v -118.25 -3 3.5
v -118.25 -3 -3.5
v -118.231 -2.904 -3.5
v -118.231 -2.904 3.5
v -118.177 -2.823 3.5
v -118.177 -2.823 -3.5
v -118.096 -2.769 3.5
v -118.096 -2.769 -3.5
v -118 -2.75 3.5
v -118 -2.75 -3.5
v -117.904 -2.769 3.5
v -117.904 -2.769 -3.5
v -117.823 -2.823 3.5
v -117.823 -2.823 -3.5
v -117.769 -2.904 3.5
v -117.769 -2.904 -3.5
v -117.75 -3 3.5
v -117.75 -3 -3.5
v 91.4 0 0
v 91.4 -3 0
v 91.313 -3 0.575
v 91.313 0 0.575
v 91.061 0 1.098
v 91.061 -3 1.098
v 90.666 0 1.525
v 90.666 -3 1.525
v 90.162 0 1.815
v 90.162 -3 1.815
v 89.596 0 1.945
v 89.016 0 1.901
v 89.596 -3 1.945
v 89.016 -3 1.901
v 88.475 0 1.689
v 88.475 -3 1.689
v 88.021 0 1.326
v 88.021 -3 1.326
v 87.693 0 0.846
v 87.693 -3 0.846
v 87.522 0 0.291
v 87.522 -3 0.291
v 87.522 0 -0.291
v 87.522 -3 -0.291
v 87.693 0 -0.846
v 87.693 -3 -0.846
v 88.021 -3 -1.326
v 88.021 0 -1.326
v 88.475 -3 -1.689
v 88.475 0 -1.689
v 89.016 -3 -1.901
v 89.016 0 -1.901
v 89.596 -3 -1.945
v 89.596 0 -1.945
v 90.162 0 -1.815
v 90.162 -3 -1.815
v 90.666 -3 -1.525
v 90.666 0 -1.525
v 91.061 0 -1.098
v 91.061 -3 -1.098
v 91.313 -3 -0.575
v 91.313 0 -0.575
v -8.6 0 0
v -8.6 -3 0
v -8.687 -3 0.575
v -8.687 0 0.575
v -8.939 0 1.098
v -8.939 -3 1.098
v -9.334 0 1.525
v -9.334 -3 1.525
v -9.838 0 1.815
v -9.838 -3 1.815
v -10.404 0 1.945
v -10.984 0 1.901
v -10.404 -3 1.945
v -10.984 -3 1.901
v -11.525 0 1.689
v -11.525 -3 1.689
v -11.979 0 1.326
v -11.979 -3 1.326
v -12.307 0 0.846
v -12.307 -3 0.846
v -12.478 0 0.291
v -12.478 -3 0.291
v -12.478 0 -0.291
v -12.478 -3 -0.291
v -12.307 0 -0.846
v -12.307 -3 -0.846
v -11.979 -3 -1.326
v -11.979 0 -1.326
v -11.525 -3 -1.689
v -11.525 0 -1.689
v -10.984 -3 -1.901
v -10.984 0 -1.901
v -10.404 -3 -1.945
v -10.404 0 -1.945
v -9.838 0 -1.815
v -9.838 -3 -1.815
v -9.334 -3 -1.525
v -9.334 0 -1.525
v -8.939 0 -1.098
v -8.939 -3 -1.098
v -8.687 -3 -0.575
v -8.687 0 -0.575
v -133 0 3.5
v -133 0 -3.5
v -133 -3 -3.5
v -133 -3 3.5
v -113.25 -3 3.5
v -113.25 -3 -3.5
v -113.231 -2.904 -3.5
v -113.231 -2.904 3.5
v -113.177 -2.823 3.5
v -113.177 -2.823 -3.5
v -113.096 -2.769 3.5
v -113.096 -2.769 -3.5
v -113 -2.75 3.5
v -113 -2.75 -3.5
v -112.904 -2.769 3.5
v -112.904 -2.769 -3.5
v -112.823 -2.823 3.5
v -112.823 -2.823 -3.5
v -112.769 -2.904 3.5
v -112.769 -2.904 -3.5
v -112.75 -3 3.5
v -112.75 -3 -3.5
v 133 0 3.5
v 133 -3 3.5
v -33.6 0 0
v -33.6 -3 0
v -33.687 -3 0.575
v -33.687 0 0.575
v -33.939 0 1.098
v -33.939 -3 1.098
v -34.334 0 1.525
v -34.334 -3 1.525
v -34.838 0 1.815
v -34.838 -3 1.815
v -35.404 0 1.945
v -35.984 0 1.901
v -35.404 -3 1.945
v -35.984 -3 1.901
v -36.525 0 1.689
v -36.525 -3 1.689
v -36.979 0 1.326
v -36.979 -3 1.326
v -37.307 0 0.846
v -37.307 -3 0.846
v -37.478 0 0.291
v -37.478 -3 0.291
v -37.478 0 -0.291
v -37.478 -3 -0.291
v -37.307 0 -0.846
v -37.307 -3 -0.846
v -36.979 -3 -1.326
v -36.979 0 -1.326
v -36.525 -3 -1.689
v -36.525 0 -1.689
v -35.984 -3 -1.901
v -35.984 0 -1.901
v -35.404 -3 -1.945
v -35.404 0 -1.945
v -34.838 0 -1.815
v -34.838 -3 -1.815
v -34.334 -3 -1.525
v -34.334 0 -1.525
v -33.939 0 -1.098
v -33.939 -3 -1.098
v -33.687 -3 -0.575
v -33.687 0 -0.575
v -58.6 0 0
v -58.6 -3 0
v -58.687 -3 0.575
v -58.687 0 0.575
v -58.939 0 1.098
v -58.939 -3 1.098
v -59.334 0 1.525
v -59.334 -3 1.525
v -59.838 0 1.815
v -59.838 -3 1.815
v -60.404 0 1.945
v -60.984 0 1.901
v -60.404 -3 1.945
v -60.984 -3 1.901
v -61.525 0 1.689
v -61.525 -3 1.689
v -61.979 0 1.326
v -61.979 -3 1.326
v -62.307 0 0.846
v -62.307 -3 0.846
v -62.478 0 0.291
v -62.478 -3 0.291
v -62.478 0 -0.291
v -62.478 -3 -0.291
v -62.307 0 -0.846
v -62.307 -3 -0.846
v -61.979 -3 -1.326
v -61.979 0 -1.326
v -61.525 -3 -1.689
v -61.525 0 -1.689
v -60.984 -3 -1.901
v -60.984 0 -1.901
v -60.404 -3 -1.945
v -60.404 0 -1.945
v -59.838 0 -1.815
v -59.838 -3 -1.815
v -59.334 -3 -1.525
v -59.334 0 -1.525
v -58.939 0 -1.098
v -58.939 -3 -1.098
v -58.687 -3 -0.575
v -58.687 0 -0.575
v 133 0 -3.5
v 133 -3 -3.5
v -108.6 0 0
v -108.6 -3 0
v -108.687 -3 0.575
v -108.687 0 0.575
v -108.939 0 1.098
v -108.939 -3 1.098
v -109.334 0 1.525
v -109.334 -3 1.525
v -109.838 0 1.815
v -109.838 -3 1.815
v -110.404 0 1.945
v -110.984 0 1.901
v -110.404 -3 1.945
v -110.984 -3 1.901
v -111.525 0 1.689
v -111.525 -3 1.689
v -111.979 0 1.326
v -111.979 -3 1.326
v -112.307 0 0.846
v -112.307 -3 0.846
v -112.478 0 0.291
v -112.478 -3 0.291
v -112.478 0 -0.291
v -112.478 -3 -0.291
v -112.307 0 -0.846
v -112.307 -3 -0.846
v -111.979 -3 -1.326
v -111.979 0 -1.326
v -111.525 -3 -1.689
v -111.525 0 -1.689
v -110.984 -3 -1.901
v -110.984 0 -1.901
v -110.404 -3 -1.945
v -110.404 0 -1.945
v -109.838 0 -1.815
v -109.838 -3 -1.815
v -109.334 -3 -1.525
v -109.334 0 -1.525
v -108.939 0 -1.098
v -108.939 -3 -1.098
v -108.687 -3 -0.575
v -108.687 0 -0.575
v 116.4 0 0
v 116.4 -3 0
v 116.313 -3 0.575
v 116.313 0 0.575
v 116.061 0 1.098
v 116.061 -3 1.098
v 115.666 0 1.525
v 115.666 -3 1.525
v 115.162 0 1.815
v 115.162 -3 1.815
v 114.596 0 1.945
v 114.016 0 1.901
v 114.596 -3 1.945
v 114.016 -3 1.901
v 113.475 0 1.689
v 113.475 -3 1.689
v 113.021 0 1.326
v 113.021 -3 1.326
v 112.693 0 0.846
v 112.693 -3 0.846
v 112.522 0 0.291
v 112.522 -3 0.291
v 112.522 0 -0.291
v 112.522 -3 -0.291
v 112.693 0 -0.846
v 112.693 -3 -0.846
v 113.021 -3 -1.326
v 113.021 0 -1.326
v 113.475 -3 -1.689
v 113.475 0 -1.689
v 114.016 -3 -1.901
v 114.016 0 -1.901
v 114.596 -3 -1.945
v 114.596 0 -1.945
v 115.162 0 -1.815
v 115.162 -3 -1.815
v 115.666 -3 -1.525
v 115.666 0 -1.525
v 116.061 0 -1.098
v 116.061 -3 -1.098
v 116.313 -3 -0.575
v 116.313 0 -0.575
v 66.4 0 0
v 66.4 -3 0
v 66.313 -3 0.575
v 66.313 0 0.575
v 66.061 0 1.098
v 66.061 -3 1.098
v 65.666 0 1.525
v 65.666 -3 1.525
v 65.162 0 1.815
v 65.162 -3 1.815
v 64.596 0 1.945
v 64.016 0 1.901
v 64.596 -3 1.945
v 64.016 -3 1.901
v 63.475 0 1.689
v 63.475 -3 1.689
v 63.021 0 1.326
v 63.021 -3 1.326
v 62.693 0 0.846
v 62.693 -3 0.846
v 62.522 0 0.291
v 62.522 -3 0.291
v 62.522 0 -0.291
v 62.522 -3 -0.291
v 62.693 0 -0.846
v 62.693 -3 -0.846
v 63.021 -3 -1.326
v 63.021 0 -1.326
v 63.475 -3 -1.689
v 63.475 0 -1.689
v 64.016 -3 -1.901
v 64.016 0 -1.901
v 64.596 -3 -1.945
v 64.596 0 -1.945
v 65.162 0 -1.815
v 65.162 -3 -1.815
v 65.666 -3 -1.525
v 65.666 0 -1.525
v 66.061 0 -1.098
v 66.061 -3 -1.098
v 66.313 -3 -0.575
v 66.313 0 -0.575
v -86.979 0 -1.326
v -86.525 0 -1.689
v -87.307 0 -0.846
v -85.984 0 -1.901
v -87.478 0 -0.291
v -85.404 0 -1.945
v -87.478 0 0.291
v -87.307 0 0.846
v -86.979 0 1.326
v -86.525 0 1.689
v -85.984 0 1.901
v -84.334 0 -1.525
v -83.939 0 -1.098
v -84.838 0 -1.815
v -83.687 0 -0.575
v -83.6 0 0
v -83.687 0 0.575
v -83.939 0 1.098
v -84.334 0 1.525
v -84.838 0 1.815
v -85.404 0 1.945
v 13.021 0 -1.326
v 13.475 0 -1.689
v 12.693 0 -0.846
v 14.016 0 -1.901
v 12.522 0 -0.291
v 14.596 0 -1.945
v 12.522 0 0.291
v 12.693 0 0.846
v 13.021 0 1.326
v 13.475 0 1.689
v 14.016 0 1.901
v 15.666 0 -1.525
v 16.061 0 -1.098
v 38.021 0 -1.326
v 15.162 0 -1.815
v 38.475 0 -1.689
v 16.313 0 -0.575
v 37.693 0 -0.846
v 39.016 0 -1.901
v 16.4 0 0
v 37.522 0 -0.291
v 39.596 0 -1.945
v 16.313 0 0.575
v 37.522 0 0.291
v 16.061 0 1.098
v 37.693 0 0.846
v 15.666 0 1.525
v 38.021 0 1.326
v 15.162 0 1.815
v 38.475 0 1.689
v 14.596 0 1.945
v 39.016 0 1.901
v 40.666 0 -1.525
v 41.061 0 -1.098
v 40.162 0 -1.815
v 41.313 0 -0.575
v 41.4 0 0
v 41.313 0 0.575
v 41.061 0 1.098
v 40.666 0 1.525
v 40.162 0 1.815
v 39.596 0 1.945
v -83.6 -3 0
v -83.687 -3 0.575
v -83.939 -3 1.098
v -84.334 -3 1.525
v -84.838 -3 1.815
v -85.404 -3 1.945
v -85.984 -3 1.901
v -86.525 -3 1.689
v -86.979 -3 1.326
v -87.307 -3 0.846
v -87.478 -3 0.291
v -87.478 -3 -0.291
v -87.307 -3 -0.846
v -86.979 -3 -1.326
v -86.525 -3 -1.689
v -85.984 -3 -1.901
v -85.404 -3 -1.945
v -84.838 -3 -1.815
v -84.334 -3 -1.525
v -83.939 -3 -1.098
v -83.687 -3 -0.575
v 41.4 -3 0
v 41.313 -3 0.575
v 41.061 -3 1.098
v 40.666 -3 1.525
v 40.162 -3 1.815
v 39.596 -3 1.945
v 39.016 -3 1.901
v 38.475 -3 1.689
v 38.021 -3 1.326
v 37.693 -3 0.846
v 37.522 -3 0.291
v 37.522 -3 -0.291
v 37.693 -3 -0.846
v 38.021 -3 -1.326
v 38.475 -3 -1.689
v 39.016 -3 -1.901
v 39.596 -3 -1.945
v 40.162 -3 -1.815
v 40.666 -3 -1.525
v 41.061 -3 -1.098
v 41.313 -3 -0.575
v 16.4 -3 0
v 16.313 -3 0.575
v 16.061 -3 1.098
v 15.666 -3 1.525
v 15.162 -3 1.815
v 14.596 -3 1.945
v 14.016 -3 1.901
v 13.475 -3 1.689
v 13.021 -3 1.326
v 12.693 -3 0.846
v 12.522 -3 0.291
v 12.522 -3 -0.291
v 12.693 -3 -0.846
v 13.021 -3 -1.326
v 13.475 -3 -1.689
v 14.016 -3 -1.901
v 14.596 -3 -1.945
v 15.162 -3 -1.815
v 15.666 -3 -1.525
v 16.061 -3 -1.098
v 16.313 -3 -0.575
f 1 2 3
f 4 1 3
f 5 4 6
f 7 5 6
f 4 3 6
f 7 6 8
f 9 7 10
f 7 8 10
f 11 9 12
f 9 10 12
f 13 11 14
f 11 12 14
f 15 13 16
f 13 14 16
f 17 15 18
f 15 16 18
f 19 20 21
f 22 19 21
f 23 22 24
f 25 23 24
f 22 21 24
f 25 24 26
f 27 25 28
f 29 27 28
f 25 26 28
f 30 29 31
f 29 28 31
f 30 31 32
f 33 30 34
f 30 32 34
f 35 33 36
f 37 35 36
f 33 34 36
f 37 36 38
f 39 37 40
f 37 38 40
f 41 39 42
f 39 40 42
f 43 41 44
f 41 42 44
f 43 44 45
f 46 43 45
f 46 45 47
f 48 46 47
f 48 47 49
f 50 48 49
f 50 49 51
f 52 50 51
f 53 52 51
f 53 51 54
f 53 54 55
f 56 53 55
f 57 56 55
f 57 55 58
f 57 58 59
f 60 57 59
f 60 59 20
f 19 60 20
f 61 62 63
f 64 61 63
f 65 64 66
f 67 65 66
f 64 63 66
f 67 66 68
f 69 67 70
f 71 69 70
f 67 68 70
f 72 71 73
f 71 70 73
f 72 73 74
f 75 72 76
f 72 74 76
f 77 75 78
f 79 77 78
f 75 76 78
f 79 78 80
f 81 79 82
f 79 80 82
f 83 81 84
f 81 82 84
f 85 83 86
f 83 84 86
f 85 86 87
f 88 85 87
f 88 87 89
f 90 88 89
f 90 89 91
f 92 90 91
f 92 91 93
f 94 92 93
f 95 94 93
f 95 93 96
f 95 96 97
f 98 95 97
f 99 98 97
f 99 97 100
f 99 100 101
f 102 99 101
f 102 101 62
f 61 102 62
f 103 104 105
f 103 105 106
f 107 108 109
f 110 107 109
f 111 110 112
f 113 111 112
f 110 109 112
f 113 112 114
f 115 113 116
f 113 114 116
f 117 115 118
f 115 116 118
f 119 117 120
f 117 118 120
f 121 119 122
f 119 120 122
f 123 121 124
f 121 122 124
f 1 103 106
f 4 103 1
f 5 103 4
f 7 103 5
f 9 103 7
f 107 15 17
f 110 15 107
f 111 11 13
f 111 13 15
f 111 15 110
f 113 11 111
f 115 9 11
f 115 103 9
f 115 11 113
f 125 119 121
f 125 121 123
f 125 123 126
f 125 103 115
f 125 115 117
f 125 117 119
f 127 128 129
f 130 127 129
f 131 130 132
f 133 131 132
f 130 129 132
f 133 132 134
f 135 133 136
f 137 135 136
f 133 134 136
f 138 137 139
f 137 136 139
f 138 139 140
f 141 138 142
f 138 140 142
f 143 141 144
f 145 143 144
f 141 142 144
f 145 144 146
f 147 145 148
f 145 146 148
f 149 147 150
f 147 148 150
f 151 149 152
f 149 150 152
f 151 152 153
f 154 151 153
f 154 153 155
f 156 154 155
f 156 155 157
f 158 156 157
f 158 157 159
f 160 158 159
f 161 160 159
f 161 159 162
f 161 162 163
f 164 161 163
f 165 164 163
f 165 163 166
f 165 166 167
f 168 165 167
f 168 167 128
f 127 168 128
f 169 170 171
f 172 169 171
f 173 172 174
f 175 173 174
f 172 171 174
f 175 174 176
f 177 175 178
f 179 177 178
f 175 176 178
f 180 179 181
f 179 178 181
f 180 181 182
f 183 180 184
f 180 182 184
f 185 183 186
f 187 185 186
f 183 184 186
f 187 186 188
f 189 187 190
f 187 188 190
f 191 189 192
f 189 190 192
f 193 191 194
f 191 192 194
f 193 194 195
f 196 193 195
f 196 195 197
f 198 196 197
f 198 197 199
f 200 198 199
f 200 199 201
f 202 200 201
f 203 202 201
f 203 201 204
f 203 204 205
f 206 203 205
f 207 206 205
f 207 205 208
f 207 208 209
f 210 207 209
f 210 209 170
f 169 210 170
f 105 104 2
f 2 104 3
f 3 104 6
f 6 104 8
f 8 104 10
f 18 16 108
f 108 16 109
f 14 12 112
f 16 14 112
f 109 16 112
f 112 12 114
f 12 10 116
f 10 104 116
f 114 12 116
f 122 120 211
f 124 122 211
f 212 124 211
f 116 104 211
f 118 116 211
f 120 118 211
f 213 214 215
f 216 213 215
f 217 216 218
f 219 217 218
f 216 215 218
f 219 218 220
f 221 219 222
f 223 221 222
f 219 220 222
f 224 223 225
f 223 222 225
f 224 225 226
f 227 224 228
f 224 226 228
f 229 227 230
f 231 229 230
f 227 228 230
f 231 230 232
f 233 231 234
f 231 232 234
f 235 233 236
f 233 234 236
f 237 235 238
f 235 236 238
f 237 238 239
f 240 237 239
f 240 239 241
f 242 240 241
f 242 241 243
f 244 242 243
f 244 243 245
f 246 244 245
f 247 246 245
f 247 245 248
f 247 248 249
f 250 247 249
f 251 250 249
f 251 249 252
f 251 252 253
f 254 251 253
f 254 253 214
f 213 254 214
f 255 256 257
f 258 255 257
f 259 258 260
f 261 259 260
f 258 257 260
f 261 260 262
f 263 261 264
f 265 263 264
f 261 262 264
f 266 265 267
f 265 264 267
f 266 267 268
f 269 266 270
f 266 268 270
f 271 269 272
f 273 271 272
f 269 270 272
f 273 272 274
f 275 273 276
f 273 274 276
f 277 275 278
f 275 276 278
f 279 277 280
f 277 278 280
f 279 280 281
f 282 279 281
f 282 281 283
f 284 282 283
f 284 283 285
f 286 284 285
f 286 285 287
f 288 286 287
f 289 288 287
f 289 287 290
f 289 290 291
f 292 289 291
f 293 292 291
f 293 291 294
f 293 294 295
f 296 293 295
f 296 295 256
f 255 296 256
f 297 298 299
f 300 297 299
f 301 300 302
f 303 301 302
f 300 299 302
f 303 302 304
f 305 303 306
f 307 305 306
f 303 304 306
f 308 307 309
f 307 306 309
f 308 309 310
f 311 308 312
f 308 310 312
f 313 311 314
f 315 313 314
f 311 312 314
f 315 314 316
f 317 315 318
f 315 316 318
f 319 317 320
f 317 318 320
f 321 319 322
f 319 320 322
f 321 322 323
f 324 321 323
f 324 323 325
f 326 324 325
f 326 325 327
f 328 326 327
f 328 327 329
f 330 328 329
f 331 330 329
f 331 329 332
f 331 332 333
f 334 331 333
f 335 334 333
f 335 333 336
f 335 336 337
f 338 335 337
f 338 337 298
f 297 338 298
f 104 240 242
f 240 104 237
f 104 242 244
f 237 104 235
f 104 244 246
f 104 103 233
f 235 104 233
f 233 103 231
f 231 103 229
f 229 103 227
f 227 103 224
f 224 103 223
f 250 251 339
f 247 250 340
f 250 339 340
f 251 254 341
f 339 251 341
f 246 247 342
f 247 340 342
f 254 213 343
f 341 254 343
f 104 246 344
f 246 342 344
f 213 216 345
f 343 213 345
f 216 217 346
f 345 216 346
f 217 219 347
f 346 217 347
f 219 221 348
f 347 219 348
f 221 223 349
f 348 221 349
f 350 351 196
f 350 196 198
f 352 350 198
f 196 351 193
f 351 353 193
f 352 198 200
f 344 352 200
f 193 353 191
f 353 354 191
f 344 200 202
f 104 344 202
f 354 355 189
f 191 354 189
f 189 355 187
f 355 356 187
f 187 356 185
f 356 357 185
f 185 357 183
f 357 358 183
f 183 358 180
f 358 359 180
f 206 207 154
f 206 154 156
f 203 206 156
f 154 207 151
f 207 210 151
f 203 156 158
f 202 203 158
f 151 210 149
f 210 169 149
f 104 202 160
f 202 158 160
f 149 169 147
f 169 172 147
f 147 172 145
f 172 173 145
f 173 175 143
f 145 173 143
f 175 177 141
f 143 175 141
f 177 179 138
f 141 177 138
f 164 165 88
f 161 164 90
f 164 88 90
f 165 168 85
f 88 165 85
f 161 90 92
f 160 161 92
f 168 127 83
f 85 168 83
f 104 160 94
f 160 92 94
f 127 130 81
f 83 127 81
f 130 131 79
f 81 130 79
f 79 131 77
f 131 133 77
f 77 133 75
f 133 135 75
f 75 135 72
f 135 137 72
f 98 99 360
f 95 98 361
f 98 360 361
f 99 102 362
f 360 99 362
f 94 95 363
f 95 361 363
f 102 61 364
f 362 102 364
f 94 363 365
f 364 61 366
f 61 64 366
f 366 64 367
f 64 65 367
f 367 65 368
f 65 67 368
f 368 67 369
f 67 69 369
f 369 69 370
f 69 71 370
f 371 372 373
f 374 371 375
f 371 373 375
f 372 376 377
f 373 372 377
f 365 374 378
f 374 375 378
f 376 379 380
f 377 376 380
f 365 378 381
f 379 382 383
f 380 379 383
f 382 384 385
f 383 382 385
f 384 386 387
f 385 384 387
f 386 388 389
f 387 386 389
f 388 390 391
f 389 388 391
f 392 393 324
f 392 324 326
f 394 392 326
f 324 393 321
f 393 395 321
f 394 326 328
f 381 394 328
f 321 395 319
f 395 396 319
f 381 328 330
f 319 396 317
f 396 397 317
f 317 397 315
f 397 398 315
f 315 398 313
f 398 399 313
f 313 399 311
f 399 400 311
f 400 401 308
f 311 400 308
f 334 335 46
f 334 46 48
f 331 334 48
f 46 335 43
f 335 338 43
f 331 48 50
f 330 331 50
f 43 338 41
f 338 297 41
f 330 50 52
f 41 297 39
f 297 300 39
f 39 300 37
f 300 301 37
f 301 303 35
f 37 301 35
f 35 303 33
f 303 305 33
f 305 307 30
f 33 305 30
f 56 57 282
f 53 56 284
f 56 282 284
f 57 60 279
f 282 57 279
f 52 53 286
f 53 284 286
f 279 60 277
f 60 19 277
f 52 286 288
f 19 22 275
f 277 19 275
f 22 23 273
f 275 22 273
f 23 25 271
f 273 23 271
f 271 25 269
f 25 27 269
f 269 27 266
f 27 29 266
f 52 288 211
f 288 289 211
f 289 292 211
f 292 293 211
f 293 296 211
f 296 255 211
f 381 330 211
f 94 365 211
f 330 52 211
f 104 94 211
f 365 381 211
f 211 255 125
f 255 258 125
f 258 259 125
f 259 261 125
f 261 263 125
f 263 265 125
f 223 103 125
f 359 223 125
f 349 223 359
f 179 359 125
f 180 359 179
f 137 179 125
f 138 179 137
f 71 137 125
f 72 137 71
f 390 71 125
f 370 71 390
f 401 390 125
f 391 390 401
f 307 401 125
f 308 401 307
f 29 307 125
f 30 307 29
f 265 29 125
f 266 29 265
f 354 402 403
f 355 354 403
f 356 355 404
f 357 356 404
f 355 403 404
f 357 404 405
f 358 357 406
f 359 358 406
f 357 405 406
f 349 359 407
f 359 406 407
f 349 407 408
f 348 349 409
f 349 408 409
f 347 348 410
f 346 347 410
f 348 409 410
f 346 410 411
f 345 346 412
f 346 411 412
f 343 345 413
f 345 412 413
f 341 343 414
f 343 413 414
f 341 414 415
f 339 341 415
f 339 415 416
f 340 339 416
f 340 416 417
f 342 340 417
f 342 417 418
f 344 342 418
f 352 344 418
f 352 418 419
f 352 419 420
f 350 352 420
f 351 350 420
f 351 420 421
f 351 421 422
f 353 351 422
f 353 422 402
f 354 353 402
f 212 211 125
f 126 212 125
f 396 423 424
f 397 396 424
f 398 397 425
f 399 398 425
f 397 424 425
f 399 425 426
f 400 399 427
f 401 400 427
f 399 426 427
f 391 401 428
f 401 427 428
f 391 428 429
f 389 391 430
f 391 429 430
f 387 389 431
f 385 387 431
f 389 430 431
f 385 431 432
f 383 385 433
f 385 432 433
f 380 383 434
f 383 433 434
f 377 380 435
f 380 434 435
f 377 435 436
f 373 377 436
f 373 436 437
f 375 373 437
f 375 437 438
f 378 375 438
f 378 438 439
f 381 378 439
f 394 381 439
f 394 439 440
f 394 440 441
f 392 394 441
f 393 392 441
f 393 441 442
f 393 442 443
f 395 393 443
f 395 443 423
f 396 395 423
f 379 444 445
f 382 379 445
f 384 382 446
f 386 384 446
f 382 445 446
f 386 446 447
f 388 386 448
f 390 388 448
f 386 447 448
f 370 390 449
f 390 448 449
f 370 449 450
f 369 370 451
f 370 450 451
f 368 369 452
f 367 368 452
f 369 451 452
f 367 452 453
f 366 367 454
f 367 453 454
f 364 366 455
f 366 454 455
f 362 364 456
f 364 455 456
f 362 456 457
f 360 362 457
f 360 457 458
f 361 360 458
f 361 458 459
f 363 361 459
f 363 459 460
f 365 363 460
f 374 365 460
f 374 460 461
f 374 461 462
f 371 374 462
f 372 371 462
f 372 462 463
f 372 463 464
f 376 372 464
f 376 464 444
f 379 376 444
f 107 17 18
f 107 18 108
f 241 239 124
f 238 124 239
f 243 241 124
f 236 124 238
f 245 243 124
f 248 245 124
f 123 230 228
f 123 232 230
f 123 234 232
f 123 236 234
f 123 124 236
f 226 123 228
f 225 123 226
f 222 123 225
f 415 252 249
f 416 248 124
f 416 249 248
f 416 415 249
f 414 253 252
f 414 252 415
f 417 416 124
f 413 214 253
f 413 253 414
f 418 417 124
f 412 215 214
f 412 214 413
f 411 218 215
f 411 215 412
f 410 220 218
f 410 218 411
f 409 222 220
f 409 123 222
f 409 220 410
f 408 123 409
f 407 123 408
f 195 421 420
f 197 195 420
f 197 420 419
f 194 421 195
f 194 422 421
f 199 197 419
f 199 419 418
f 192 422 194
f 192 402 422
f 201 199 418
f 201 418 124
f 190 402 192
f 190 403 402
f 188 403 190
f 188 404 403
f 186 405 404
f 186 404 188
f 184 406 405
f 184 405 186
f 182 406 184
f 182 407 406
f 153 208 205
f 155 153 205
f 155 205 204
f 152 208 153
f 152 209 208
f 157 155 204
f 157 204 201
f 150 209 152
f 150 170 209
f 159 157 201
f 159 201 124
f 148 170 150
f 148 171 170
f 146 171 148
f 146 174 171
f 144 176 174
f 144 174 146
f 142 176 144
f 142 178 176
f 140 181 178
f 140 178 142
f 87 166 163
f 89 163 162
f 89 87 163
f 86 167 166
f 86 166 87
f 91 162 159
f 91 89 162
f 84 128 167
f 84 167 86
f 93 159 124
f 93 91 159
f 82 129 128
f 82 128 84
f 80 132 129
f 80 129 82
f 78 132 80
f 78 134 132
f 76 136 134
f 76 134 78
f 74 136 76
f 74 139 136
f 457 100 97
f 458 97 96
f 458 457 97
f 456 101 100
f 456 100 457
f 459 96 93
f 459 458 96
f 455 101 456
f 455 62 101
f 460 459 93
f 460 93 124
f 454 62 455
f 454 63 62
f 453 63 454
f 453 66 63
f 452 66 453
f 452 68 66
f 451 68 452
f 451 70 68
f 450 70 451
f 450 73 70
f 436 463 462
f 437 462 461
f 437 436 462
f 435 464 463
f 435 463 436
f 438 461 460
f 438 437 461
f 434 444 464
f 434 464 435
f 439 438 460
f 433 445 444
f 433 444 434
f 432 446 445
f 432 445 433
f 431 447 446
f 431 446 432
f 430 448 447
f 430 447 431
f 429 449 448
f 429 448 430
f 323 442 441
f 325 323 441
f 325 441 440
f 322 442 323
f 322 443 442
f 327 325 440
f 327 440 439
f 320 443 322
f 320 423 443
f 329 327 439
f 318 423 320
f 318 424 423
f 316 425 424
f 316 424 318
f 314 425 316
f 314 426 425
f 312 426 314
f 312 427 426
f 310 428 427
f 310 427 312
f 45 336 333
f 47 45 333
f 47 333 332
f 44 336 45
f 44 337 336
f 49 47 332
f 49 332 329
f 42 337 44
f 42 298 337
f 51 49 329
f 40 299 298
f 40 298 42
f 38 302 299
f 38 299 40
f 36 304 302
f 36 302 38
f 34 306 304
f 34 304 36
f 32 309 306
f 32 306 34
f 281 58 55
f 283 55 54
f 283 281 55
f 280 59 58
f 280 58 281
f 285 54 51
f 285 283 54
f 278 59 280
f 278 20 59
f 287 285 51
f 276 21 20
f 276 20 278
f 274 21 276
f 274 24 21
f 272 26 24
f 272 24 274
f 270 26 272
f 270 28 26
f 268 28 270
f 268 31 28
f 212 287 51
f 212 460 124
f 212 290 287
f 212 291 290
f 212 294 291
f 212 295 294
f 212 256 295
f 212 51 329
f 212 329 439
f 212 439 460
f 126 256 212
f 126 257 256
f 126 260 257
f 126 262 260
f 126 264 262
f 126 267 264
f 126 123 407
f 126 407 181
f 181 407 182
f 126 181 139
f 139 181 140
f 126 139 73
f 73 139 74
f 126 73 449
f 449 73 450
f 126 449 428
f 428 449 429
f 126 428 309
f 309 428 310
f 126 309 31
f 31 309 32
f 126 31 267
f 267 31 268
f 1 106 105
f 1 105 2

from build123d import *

# Parameters (mm, degrees)
F0_W     = 266
F0_H     = 7
F1_DEPTH = 3
F2_R     = 1.95
F3_DEPTH = 3.001
F4_R     = 0.25
F5_DEPTH = 7.001


with BuildPart() as f1:
    # F0 (on Front) → F1 (new body)
    with BuildSketch(Plane.XZ):
        Rectangle(F0_W, F0_H)
    extrude(amount=F1_DEPTH)

    # F2 (on face) → F3 (cut, through all)
    with BuildSketch(Plane.XZ.offset(3)):
        with Locations((-110.55, 0)):
            Circle(F2_R)
        with Locations((-85.55, 0)):
            Circle(F2_R)
        with Locations((-60.55, 0)):
            Circle(F2_R)
        with Locations((-35.55, 0)):
            Circle(F2_R)
        with Locations((-10.55, 0)):
            Circle(F2_R)
        with Locations((14.45, 0)):
            Circle(F2_R)
        with Locations((39.45, 0)):
            Circle(F2_R)
        with Locations((64.45, 0)):
            Circle(F2_R)
        with Locations((89.45, 0)):
            Circle(F2_R)
        with Locations((114.45, 0)):
            Circle(F2_R)
    extrude(amount=-F3_DEPTH, mode=Mode.SUBTRACT)

    # F4 (on face) → F5 (cut, through all)
    with BuildSketch(Plane(origin=(0, 0, -3.5), x_dir=(1, 0, 0), z_dir=(0, 0, -1))):
        with Locations((-118, 3)):
            Circle(F4_R)
        with Locations((-113, 3)):
            Circle(F4_R)
    extrude(amount=-F5_DEPTH, mode=Mode.SUBTRACT)


solid = f1.part
